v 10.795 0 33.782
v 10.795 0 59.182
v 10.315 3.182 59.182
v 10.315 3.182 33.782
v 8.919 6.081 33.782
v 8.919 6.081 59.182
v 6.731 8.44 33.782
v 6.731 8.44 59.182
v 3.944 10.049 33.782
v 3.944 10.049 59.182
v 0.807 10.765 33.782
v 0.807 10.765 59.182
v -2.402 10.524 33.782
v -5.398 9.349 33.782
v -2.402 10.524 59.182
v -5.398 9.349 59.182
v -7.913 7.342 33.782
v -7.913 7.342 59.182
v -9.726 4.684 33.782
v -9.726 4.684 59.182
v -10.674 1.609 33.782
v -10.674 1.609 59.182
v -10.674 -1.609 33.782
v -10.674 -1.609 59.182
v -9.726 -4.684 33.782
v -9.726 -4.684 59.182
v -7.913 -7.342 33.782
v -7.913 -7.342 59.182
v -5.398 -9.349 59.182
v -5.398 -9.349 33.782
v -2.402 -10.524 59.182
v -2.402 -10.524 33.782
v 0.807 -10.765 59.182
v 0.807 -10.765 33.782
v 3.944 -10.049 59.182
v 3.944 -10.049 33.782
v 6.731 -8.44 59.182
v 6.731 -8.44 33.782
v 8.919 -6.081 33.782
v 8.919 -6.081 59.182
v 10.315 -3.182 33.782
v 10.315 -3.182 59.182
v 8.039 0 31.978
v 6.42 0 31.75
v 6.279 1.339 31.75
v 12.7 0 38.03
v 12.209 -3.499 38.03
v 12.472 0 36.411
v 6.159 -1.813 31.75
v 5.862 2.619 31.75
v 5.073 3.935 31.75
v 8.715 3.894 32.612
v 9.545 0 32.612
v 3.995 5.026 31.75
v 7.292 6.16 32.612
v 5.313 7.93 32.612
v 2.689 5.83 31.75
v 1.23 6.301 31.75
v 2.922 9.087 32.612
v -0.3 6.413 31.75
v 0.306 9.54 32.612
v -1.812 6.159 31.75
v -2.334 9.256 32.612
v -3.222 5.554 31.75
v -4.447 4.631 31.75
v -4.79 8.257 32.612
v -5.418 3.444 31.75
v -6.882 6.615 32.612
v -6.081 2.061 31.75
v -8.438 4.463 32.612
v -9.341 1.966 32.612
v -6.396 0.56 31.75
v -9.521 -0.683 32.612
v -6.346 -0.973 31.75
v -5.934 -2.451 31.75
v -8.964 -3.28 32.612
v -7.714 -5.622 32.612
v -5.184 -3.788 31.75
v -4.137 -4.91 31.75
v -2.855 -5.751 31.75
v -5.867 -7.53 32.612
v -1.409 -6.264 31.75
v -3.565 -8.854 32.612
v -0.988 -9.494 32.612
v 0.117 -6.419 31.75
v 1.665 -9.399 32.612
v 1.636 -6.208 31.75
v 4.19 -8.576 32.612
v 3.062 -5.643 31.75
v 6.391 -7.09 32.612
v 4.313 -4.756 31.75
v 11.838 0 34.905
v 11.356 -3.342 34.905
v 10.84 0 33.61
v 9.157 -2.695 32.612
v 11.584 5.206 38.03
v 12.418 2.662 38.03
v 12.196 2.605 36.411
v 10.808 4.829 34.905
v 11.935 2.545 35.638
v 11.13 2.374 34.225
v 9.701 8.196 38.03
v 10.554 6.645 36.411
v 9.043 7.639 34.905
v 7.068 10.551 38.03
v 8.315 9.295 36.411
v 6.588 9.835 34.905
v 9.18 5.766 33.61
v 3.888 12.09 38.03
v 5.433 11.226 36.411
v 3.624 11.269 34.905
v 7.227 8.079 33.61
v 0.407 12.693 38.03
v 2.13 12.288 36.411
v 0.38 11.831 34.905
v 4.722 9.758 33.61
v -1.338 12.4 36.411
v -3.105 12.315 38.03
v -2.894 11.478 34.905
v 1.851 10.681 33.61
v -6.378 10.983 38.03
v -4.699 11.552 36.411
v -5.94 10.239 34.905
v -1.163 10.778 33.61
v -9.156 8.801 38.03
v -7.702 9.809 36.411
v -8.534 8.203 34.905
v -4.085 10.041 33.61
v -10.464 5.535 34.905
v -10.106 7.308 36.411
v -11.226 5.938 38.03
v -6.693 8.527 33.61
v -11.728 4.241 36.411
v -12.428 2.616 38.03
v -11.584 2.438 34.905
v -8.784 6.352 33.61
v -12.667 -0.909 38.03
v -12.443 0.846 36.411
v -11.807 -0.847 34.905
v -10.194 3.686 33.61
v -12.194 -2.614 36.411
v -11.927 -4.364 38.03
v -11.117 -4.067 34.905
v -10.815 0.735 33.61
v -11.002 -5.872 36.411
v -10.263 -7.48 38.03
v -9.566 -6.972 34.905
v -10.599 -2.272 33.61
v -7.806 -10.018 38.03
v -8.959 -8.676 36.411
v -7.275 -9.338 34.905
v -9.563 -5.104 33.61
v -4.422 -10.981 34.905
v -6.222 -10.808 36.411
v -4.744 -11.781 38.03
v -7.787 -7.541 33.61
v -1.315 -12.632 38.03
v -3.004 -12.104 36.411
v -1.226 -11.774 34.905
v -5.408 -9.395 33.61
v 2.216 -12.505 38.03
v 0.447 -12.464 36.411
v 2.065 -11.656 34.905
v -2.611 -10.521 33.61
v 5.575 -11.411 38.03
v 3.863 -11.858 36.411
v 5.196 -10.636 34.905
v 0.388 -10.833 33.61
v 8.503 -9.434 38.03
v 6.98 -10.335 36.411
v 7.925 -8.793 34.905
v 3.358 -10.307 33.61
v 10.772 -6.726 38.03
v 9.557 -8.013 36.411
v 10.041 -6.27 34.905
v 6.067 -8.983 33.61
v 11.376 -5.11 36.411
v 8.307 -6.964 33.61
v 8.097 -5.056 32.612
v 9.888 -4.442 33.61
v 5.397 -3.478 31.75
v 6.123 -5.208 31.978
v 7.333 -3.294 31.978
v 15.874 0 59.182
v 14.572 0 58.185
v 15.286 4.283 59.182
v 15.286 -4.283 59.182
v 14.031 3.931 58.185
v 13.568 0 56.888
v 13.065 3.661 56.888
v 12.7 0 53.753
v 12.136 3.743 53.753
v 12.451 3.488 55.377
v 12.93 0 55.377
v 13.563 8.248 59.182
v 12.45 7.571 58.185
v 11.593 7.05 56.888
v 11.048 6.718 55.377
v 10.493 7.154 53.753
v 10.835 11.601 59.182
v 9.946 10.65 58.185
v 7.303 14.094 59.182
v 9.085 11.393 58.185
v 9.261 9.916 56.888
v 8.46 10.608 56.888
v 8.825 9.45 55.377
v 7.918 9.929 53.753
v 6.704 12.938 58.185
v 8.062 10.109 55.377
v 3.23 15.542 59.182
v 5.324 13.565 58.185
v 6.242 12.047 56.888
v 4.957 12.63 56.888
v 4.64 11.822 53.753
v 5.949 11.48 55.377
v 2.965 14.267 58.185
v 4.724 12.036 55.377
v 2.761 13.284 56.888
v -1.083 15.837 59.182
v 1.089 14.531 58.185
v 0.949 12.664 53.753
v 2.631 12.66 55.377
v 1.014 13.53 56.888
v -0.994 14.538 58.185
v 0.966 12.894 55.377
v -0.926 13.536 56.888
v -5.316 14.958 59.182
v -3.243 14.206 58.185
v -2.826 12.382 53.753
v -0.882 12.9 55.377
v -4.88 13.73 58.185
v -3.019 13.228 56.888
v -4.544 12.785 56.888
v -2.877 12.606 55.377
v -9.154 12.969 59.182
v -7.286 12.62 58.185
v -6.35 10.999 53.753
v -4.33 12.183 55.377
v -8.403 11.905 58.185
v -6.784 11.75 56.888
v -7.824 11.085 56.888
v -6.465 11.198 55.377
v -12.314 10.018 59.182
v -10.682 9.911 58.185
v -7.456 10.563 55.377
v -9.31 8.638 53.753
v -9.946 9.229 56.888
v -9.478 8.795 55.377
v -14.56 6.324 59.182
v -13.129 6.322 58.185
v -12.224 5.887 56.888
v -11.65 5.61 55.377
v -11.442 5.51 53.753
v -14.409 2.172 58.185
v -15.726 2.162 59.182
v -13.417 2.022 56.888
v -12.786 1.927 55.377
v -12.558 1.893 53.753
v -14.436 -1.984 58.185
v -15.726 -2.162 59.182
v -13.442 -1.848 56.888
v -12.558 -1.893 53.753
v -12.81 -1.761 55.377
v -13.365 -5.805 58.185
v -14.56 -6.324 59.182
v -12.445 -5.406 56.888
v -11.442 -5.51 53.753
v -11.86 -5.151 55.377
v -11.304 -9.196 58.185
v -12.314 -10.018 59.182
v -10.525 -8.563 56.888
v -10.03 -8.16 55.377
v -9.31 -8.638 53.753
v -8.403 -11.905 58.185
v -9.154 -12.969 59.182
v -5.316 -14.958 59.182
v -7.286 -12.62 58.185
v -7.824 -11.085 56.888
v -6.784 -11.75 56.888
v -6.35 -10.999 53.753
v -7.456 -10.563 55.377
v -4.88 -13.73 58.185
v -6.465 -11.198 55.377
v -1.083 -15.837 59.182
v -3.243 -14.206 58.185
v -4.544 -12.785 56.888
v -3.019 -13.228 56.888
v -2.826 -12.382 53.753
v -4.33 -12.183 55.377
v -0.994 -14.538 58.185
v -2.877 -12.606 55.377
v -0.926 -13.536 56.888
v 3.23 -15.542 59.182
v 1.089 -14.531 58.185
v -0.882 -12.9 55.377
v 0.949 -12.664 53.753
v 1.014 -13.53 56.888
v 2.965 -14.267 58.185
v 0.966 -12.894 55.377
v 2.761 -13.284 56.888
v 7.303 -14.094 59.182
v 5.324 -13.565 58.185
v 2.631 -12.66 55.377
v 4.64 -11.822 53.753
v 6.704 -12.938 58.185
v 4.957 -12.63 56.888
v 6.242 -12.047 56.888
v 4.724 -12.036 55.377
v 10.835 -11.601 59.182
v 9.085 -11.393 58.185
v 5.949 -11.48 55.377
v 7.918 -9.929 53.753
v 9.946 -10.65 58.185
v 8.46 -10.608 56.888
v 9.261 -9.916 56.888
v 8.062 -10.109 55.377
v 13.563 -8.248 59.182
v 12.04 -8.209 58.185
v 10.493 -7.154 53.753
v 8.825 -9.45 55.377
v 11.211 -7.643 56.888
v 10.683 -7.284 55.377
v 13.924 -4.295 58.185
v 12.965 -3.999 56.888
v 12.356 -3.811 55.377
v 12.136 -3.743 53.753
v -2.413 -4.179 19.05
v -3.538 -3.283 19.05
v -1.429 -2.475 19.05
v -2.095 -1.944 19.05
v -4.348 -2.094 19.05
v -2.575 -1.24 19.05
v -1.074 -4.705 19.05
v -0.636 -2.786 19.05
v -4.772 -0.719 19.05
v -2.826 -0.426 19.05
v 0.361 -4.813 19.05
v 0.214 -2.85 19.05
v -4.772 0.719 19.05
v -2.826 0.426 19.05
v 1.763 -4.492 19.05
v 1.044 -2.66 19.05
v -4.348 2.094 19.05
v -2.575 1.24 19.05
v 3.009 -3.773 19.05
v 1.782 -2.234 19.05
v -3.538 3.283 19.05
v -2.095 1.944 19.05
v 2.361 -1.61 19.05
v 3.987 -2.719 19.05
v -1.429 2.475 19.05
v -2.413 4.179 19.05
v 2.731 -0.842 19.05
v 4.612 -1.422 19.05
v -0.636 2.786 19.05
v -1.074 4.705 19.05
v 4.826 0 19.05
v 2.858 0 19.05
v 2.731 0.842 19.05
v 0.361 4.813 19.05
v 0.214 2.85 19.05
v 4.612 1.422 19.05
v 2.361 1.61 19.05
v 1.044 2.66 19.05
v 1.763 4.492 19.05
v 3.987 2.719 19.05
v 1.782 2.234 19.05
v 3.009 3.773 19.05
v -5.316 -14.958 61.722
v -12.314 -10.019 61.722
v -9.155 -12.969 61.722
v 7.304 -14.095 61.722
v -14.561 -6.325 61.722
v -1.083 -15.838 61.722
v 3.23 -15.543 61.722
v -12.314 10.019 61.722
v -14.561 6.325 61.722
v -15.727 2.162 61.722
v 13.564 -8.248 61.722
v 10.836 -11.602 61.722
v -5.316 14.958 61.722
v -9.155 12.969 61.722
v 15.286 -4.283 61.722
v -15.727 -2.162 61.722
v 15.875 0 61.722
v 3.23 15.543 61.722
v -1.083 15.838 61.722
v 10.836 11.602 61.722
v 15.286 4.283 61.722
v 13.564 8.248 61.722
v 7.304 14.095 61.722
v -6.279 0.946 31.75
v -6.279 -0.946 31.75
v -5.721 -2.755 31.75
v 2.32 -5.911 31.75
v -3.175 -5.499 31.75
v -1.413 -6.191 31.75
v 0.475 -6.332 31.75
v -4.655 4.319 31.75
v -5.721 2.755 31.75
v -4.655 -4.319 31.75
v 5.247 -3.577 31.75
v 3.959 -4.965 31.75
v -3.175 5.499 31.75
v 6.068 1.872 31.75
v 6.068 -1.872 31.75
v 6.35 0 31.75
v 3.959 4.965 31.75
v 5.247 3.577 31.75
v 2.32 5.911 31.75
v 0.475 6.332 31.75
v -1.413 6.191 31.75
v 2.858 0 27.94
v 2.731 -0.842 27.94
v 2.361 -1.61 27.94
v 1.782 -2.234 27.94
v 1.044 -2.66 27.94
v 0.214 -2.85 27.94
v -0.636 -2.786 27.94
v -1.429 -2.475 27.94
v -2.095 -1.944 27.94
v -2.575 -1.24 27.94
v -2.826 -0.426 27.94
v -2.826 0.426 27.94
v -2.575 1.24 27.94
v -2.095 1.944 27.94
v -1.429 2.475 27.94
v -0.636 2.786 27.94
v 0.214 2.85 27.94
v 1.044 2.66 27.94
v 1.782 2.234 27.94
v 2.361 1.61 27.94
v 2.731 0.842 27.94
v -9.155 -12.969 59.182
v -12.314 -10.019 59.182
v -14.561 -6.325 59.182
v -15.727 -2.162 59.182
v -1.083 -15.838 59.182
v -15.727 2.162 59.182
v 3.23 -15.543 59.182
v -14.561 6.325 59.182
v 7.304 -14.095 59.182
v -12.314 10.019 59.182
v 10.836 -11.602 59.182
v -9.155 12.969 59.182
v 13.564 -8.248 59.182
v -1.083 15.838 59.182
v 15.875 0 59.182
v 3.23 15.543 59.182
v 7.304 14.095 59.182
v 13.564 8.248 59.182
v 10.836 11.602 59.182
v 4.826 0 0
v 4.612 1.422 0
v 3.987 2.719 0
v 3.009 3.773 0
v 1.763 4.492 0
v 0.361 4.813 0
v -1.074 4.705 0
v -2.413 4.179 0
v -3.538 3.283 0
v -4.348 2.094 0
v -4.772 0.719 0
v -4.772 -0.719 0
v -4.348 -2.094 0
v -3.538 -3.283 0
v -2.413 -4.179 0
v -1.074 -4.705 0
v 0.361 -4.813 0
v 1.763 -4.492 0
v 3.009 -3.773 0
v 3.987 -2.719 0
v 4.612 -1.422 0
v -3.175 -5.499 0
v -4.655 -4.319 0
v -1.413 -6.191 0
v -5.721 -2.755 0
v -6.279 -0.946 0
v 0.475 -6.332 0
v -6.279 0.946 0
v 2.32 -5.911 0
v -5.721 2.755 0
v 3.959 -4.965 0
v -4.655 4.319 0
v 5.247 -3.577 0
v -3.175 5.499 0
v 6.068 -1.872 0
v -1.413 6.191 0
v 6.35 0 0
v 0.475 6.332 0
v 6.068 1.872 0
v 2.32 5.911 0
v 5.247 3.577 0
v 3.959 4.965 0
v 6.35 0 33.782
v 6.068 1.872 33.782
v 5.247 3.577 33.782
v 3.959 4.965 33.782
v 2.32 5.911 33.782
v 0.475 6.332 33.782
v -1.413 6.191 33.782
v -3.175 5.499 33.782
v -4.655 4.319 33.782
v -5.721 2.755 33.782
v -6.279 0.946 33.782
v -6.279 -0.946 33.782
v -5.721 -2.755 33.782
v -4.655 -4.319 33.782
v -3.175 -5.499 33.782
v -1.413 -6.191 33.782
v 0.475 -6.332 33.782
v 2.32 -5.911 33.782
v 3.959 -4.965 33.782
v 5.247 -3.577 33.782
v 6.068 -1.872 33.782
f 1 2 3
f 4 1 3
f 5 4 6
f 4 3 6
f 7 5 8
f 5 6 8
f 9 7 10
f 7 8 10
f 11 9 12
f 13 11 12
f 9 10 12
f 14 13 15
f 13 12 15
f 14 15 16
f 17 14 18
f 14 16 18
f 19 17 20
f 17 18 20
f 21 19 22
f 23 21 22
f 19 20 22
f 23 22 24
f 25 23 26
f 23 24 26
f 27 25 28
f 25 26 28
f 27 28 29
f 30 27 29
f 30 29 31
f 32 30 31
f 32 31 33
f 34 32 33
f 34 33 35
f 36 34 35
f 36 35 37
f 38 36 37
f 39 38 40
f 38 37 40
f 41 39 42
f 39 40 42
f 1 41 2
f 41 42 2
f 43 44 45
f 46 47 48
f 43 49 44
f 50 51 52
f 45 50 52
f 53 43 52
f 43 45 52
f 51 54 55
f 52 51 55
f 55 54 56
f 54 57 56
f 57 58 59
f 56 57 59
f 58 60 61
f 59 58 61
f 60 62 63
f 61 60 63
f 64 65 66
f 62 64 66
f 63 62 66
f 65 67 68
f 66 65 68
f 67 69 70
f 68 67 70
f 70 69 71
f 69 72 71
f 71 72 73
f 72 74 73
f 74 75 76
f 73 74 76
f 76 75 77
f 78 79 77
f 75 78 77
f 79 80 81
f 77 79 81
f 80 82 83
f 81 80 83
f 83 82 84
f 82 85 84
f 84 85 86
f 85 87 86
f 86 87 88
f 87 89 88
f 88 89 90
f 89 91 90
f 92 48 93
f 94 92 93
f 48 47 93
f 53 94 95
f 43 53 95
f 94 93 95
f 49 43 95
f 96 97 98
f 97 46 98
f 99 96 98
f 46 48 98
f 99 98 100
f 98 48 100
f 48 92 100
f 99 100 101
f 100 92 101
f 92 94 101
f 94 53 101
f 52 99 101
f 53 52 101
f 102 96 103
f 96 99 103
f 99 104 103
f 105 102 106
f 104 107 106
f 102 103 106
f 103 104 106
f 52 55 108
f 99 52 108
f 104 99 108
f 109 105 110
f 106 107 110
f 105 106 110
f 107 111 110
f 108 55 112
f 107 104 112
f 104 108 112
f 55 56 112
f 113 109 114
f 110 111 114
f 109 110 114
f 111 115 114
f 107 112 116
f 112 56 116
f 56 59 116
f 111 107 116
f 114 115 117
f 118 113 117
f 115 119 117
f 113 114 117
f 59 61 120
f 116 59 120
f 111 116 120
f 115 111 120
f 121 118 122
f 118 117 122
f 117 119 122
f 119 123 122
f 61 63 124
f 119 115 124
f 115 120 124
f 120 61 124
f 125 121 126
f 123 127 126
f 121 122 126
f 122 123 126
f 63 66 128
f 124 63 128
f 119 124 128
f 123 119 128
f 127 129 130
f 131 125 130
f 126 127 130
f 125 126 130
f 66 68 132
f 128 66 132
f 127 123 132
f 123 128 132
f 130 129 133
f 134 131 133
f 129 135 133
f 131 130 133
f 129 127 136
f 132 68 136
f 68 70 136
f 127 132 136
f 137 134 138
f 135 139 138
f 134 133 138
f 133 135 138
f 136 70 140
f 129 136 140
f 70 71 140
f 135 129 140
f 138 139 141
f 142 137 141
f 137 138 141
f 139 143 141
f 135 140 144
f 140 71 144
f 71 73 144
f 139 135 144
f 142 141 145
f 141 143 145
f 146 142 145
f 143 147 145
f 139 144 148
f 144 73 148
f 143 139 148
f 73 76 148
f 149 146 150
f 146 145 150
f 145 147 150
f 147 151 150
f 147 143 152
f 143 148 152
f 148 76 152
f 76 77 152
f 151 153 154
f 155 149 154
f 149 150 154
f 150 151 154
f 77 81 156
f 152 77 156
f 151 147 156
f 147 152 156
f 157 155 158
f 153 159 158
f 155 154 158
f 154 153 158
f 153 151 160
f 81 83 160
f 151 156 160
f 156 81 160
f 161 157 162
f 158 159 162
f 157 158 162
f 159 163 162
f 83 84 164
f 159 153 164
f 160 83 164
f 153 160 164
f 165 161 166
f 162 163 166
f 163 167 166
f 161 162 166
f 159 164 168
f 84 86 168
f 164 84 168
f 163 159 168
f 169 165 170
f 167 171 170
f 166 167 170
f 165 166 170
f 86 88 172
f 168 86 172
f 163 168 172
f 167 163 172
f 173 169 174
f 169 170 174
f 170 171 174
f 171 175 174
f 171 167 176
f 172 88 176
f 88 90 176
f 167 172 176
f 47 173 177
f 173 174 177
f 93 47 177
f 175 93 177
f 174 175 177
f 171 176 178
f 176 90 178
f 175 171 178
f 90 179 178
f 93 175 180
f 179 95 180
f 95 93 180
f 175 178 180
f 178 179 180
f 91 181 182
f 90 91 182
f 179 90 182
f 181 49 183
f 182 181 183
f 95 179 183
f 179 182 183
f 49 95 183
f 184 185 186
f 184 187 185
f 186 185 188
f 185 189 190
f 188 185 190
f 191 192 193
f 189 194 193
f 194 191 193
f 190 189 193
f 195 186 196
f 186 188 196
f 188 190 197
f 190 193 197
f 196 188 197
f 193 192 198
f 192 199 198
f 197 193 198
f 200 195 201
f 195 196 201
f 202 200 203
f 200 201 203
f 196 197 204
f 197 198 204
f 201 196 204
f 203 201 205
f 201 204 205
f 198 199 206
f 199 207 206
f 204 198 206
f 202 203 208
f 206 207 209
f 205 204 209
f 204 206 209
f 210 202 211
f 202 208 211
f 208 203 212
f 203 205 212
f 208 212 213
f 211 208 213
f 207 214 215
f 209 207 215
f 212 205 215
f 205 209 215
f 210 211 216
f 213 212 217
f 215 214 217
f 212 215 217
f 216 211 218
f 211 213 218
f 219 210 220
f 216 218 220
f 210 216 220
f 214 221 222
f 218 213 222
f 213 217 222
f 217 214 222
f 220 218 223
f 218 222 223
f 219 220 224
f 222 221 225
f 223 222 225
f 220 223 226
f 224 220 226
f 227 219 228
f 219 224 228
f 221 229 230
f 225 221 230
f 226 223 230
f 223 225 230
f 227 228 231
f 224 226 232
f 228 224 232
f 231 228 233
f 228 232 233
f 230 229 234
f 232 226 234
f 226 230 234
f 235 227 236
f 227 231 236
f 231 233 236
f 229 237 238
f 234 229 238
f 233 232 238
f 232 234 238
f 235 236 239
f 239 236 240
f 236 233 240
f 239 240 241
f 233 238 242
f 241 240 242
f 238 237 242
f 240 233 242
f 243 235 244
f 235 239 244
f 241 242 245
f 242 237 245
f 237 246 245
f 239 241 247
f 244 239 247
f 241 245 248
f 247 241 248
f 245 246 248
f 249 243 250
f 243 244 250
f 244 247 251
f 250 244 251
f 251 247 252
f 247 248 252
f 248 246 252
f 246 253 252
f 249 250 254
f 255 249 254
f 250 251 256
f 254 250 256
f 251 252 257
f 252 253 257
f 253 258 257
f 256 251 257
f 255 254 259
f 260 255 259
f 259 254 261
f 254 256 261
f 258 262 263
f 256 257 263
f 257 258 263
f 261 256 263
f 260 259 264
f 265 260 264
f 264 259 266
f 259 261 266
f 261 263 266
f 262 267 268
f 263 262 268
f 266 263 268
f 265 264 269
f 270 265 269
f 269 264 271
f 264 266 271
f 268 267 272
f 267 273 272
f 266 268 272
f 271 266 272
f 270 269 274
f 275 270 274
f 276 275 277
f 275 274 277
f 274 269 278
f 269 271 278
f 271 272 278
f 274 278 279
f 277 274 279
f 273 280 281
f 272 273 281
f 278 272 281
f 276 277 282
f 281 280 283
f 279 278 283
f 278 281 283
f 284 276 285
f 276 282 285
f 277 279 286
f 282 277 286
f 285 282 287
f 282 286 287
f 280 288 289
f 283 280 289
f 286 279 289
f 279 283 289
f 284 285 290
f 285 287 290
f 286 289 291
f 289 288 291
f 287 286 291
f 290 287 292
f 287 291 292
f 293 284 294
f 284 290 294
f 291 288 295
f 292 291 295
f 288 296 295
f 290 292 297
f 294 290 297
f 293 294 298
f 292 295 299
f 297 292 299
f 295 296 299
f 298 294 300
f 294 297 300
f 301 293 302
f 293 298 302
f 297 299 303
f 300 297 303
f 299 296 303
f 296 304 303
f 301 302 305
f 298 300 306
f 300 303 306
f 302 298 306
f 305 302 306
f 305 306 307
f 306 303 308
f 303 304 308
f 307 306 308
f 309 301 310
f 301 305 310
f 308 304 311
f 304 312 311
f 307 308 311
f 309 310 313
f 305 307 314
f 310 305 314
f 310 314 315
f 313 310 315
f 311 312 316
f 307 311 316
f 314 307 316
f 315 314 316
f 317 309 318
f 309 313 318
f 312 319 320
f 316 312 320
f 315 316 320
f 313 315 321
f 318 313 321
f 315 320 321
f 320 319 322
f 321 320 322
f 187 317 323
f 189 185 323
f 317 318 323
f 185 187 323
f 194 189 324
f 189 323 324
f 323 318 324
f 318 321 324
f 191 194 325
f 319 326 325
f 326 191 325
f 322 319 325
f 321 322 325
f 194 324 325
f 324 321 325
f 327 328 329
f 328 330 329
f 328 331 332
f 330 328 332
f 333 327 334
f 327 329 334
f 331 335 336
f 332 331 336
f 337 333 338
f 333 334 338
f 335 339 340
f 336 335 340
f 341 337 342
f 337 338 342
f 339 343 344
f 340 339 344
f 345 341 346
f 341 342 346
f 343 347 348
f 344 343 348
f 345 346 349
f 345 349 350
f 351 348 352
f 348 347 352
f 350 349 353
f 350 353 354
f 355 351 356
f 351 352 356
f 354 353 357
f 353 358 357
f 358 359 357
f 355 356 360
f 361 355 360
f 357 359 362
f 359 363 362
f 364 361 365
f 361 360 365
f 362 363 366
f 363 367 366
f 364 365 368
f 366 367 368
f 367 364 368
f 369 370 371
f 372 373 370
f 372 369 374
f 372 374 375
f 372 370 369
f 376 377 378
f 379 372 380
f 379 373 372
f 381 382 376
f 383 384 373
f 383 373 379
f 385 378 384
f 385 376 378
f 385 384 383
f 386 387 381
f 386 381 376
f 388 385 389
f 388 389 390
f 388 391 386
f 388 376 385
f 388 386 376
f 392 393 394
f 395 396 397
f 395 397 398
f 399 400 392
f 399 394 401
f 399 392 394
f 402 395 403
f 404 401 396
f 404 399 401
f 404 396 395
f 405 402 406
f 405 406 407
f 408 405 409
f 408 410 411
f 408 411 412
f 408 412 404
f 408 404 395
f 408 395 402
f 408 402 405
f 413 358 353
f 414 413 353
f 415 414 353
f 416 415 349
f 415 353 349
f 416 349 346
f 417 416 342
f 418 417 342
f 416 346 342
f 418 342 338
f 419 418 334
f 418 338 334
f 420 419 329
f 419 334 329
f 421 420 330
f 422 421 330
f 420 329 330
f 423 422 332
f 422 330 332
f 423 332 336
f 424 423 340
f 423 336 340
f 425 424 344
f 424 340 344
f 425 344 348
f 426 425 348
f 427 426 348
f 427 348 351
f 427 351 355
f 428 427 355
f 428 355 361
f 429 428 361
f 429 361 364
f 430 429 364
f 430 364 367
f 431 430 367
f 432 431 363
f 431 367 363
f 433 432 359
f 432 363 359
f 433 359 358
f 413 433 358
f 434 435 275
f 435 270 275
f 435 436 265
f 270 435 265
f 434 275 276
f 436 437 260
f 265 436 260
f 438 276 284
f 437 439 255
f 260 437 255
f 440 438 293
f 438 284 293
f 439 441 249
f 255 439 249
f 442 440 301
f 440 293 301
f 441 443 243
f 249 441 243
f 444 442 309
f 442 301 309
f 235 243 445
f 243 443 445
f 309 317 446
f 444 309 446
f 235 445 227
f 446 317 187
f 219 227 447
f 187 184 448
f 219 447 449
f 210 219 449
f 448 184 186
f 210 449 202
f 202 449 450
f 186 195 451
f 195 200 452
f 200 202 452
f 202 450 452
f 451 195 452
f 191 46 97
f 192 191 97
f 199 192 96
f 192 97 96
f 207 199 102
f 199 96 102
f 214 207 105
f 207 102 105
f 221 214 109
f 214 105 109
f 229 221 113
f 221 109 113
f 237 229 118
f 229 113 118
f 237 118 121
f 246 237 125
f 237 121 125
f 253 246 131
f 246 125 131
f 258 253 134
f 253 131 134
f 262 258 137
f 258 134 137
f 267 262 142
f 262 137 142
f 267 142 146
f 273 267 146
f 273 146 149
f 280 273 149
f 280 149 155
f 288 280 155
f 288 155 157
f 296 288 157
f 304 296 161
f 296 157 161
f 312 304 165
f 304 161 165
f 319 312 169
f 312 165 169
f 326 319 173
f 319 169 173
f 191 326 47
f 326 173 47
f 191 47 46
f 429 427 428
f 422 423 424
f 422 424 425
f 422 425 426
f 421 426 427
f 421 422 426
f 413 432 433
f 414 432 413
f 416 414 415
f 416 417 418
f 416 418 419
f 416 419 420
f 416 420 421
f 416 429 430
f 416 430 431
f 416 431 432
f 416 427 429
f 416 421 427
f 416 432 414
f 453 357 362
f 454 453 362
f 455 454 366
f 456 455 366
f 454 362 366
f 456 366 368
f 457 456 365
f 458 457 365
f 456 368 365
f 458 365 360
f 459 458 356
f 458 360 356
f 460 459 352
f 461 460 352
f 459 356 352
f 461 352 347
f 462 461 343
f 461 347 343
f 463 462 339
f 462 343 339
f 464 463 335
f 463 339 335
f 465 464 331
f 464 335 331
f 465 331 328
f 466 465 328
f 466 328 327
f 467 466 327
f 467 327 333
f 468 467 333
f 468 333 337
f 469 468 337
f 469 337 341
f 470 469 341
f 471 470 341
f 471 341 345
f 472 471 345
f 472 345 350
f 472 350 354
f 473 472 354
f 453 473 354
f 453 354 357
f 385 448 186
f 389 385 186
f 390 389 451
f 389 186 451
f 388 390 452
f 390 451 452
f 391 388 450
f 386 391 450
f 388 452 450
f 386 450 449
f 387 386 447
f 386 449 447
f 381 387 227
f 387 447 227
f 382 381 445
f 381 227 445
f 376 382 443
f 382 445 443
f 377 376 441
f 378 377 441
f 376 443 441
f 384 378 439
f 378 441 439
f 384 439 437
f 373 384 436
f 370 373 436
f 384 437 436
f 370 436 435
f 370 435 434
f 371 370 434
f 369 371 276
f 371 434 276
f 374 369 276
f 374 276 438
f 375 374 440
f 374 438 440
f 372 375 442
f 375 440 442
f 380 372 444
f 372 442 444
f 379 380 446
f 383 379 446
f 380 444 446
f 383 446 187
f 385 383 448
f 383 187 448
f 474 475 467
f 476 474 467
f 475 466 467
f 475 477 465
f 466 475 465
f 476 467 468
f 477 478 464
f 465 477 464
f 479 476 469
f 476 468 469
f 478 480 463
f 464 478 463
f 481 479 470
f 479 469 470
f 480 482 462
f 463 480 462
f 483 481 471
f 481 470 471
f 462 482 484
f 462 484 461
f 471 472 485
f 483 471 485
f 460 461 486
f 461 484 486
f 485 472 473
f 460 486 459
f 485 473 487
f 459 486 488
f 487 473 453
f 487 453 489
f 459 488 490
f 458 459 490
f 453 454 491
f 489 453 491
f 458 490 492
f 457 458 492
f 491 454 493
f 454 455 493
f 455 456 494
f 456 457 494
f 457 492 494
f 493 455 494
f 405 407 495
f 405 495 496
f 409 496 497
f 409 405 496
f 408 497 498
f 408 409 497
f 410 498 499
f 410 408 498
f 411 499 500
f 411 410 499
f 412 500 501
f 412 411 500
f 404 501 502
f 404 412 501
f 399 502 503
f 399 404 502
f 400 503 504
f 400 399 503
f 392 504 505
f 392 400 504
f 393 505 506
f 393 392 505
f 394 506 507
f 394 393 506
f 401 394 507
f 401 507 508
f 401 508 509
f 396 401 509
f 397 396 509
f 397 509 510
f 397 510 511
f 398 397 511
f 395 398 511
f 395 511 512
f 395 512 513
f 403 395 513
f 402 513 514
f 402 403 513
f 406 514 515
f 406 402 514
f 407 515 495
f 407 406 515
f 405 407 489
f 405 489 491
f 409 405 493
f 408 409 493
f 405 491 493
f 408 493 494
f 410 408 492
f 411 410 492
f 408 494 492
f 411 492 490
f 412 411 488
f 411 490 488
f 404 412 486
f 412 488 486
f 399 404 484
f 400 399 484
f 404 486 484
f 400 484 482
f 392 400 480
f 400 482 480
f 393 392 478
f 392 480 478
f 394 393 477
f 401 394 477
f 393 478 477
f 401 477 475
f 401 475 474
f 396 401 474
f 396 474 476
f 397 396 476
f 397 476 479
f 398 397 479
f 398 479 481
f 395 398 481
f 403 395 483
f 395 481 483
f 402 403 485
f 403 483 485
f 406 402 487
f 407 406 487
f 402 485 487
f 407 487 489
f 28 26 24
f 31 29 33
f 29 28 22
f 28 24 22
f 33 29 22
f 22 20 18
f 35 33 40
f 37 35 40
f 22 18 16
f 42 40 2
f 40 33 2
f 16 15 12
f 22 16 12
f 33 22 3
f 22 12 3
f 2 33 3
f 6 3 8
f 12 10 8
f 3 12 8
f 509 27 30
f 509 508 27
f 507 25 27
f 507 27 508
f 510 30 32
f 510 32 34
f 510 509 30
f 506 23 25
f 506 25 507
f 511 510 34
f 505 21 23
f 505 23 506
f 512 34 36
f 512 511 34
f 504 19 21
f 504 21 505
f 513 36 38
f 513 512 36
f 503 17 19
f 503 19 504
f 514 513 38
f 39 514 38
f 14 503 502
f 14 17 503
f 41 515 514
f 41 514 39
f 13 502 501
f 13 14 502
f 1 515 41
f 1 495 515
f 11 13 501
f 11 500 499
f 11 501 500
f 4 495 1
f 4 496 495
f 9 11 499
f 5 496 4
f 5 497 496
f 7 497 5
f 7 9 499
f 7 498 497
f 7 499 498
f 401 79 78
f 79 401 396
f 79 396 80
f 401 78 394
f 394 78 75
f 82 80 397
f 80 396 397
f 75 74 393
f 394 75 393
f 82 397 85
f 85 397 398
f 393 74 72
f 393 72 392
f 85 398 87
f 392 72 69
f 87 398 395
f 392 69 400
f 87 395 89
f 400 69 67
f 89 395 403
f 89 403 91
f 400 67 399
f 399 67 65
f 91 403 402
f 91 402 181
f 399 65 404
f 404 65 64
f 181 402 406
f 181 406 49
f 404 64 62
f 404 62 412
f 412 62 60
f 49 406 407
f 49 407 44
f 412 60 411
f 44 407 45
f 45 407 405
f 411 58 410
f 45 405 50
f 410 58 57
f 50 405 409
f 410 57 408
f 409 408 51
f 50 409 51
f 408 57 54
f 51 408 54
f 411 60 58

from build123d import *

# Parameters (mm, degrees)
F0_R      = 6.35
F1_DEPTH  = 19.05
F2_R      = 4.826
F3_DEPTH  = 19.051
F4_R      = 6.35
F5_DEPTH  = 12.7
F6_R      = 2.8575
F7_DEPTH  = 8.89
F8_R      = 12.7
F8_R_2    = 6.35
F9_DEPTH  = 2.032
F10_R     = 12.7
F11_DEPTH = 25.4
F12_R     = 10.795
F13_DEPTH = 25.4
F14_R     = 15.875
F15_DEPTH = 2.54


# Not quite as in the source:
# - a fillet or chamfer that OpenCascade refuses, or shapes differently, is made with other operations: its cross-section is extruded or revolved along the edge and cut away or added


with BuildPart() as f1:
    # F0 (on Top) → F1 (new body)
    with BuildSketch(Plane.XY):
        Circle(F0_R)
    extrude(amount=F1_DEPTH)

    # F2 (on face) → F3 (cut, through all)
    with BuildSketch(Plane.XY.offset(19.05)):
        Circle(F2_R)
    extrude(amount=-F3_DEPTH, mode=Mode.SUBTRACT)

    # F4 (on face) → F5 (join)
    with BuildSketch(Plane.XY.offset(19.05)):
        Circle(F4_R)
    extrude(amount=F5_DEPTH)

    # F6 (on face) → F7 (cut)
    with BuildSketch(Plane(origin=(0, 0, 19.05), x_dir=(1, 0, 0), z_dir=(0, 0, -1))):
        Circle(F6_R)
    extrude(amount=-F7_DEPTH, mode=Mode.SUBTRACT)


with BuildPart() as f9:
    # F8 (on face) → F9 (new body)
    with BuildSketch(Plane.XY.offset(31.75)):
        Circle(F8_R)
        Circle(F8_R_2, mode=Mode.SUBTRACT)
    extrude(amount=F9_DEPTH)

    # F10 (on face) → F11 (join)
    with BuildSketch(Plane.XY.offset(33.782)):
        Circle(F10_R)
    extrude(amount=F11_DEPTH)

    # F12 (on face) → F13 (cut)
    with BuildSketch(Plane.XY.offset(59.182)):
        Circle(F12_R)
    extrude(amount=-F13_DEPTH, mode=Mode.SUBTRACT)

    # F14 (on face) → F15 (join)
    with BuildSketch(Plane.XY.offset(59.182)):
        Circle(F14_R)
    extrude(amount=F15_DEPTH)

    # F16: fillet of radius 6.35 on 3 edges, made by hand

    # F16_s1 → F16_t2 (revolve)
    with BuildSketch(Plane.XZ):
        with BuildLine():
            ThreePointArc((15.8747999696, 59.1823463926), (13.5503822614, 56.8576225725), (12.6996, 53.6821811755))
            Line((12.6996, 53.6821811755), (12.0644634315, 53.6821811755))
            ThreePointArc((12.0644634315, 53.6821811755), (12.0648634315, 56.4320905877), (12.0648634315, 59.182))
            Line((12.0648634315, 59.182), (12.7, 59.8171365685))
            ThreePointArc((12.7, 59.8171365685), (14.2873999848, 59.8171365685), (15.557183398, 59.7323629143))
            Line((15.557183398, 59.7323629143), (15.8747999696, 59.1823463926))
        make_face()
    revolve(axis=Axis((0, 0, 59.182), (0, 0, 1)))

    # F16_s3 → F16_t4 (revolve, cut)
    with BuildSketch(Plane.XZ):
        with BuildLine():
            ThreePointArc((12.7004, 38.100965612), (10.8404694904, 33.6102133219), (6.3500000608, 31.7496))
            Line((6.3500000608, 31.7496), (6.3500966354, 31.1144634388))
            ThreePointArc((6.3500966354, 31.1144634388), (9.5250000304, 31.1148634315), (12.7, 31.1148634315))
            Line((12.7, 31.1148634315), (13.3351365685, 31.75))
            ThreePointArc((13.3351365685, 31.75), (13.3351365685, 34.925482806), (13.3355365685, 38.100965612))
            Line((13.3355365685, 38.100965612), (12.7004, 38.100965612))
        make_face()
    revolve(axis=Axis((0, 0, 31.75), (0, 0, 1)), mode=Mode.SUBTRACT)


solid = Compound([f1.part, f9.part])
